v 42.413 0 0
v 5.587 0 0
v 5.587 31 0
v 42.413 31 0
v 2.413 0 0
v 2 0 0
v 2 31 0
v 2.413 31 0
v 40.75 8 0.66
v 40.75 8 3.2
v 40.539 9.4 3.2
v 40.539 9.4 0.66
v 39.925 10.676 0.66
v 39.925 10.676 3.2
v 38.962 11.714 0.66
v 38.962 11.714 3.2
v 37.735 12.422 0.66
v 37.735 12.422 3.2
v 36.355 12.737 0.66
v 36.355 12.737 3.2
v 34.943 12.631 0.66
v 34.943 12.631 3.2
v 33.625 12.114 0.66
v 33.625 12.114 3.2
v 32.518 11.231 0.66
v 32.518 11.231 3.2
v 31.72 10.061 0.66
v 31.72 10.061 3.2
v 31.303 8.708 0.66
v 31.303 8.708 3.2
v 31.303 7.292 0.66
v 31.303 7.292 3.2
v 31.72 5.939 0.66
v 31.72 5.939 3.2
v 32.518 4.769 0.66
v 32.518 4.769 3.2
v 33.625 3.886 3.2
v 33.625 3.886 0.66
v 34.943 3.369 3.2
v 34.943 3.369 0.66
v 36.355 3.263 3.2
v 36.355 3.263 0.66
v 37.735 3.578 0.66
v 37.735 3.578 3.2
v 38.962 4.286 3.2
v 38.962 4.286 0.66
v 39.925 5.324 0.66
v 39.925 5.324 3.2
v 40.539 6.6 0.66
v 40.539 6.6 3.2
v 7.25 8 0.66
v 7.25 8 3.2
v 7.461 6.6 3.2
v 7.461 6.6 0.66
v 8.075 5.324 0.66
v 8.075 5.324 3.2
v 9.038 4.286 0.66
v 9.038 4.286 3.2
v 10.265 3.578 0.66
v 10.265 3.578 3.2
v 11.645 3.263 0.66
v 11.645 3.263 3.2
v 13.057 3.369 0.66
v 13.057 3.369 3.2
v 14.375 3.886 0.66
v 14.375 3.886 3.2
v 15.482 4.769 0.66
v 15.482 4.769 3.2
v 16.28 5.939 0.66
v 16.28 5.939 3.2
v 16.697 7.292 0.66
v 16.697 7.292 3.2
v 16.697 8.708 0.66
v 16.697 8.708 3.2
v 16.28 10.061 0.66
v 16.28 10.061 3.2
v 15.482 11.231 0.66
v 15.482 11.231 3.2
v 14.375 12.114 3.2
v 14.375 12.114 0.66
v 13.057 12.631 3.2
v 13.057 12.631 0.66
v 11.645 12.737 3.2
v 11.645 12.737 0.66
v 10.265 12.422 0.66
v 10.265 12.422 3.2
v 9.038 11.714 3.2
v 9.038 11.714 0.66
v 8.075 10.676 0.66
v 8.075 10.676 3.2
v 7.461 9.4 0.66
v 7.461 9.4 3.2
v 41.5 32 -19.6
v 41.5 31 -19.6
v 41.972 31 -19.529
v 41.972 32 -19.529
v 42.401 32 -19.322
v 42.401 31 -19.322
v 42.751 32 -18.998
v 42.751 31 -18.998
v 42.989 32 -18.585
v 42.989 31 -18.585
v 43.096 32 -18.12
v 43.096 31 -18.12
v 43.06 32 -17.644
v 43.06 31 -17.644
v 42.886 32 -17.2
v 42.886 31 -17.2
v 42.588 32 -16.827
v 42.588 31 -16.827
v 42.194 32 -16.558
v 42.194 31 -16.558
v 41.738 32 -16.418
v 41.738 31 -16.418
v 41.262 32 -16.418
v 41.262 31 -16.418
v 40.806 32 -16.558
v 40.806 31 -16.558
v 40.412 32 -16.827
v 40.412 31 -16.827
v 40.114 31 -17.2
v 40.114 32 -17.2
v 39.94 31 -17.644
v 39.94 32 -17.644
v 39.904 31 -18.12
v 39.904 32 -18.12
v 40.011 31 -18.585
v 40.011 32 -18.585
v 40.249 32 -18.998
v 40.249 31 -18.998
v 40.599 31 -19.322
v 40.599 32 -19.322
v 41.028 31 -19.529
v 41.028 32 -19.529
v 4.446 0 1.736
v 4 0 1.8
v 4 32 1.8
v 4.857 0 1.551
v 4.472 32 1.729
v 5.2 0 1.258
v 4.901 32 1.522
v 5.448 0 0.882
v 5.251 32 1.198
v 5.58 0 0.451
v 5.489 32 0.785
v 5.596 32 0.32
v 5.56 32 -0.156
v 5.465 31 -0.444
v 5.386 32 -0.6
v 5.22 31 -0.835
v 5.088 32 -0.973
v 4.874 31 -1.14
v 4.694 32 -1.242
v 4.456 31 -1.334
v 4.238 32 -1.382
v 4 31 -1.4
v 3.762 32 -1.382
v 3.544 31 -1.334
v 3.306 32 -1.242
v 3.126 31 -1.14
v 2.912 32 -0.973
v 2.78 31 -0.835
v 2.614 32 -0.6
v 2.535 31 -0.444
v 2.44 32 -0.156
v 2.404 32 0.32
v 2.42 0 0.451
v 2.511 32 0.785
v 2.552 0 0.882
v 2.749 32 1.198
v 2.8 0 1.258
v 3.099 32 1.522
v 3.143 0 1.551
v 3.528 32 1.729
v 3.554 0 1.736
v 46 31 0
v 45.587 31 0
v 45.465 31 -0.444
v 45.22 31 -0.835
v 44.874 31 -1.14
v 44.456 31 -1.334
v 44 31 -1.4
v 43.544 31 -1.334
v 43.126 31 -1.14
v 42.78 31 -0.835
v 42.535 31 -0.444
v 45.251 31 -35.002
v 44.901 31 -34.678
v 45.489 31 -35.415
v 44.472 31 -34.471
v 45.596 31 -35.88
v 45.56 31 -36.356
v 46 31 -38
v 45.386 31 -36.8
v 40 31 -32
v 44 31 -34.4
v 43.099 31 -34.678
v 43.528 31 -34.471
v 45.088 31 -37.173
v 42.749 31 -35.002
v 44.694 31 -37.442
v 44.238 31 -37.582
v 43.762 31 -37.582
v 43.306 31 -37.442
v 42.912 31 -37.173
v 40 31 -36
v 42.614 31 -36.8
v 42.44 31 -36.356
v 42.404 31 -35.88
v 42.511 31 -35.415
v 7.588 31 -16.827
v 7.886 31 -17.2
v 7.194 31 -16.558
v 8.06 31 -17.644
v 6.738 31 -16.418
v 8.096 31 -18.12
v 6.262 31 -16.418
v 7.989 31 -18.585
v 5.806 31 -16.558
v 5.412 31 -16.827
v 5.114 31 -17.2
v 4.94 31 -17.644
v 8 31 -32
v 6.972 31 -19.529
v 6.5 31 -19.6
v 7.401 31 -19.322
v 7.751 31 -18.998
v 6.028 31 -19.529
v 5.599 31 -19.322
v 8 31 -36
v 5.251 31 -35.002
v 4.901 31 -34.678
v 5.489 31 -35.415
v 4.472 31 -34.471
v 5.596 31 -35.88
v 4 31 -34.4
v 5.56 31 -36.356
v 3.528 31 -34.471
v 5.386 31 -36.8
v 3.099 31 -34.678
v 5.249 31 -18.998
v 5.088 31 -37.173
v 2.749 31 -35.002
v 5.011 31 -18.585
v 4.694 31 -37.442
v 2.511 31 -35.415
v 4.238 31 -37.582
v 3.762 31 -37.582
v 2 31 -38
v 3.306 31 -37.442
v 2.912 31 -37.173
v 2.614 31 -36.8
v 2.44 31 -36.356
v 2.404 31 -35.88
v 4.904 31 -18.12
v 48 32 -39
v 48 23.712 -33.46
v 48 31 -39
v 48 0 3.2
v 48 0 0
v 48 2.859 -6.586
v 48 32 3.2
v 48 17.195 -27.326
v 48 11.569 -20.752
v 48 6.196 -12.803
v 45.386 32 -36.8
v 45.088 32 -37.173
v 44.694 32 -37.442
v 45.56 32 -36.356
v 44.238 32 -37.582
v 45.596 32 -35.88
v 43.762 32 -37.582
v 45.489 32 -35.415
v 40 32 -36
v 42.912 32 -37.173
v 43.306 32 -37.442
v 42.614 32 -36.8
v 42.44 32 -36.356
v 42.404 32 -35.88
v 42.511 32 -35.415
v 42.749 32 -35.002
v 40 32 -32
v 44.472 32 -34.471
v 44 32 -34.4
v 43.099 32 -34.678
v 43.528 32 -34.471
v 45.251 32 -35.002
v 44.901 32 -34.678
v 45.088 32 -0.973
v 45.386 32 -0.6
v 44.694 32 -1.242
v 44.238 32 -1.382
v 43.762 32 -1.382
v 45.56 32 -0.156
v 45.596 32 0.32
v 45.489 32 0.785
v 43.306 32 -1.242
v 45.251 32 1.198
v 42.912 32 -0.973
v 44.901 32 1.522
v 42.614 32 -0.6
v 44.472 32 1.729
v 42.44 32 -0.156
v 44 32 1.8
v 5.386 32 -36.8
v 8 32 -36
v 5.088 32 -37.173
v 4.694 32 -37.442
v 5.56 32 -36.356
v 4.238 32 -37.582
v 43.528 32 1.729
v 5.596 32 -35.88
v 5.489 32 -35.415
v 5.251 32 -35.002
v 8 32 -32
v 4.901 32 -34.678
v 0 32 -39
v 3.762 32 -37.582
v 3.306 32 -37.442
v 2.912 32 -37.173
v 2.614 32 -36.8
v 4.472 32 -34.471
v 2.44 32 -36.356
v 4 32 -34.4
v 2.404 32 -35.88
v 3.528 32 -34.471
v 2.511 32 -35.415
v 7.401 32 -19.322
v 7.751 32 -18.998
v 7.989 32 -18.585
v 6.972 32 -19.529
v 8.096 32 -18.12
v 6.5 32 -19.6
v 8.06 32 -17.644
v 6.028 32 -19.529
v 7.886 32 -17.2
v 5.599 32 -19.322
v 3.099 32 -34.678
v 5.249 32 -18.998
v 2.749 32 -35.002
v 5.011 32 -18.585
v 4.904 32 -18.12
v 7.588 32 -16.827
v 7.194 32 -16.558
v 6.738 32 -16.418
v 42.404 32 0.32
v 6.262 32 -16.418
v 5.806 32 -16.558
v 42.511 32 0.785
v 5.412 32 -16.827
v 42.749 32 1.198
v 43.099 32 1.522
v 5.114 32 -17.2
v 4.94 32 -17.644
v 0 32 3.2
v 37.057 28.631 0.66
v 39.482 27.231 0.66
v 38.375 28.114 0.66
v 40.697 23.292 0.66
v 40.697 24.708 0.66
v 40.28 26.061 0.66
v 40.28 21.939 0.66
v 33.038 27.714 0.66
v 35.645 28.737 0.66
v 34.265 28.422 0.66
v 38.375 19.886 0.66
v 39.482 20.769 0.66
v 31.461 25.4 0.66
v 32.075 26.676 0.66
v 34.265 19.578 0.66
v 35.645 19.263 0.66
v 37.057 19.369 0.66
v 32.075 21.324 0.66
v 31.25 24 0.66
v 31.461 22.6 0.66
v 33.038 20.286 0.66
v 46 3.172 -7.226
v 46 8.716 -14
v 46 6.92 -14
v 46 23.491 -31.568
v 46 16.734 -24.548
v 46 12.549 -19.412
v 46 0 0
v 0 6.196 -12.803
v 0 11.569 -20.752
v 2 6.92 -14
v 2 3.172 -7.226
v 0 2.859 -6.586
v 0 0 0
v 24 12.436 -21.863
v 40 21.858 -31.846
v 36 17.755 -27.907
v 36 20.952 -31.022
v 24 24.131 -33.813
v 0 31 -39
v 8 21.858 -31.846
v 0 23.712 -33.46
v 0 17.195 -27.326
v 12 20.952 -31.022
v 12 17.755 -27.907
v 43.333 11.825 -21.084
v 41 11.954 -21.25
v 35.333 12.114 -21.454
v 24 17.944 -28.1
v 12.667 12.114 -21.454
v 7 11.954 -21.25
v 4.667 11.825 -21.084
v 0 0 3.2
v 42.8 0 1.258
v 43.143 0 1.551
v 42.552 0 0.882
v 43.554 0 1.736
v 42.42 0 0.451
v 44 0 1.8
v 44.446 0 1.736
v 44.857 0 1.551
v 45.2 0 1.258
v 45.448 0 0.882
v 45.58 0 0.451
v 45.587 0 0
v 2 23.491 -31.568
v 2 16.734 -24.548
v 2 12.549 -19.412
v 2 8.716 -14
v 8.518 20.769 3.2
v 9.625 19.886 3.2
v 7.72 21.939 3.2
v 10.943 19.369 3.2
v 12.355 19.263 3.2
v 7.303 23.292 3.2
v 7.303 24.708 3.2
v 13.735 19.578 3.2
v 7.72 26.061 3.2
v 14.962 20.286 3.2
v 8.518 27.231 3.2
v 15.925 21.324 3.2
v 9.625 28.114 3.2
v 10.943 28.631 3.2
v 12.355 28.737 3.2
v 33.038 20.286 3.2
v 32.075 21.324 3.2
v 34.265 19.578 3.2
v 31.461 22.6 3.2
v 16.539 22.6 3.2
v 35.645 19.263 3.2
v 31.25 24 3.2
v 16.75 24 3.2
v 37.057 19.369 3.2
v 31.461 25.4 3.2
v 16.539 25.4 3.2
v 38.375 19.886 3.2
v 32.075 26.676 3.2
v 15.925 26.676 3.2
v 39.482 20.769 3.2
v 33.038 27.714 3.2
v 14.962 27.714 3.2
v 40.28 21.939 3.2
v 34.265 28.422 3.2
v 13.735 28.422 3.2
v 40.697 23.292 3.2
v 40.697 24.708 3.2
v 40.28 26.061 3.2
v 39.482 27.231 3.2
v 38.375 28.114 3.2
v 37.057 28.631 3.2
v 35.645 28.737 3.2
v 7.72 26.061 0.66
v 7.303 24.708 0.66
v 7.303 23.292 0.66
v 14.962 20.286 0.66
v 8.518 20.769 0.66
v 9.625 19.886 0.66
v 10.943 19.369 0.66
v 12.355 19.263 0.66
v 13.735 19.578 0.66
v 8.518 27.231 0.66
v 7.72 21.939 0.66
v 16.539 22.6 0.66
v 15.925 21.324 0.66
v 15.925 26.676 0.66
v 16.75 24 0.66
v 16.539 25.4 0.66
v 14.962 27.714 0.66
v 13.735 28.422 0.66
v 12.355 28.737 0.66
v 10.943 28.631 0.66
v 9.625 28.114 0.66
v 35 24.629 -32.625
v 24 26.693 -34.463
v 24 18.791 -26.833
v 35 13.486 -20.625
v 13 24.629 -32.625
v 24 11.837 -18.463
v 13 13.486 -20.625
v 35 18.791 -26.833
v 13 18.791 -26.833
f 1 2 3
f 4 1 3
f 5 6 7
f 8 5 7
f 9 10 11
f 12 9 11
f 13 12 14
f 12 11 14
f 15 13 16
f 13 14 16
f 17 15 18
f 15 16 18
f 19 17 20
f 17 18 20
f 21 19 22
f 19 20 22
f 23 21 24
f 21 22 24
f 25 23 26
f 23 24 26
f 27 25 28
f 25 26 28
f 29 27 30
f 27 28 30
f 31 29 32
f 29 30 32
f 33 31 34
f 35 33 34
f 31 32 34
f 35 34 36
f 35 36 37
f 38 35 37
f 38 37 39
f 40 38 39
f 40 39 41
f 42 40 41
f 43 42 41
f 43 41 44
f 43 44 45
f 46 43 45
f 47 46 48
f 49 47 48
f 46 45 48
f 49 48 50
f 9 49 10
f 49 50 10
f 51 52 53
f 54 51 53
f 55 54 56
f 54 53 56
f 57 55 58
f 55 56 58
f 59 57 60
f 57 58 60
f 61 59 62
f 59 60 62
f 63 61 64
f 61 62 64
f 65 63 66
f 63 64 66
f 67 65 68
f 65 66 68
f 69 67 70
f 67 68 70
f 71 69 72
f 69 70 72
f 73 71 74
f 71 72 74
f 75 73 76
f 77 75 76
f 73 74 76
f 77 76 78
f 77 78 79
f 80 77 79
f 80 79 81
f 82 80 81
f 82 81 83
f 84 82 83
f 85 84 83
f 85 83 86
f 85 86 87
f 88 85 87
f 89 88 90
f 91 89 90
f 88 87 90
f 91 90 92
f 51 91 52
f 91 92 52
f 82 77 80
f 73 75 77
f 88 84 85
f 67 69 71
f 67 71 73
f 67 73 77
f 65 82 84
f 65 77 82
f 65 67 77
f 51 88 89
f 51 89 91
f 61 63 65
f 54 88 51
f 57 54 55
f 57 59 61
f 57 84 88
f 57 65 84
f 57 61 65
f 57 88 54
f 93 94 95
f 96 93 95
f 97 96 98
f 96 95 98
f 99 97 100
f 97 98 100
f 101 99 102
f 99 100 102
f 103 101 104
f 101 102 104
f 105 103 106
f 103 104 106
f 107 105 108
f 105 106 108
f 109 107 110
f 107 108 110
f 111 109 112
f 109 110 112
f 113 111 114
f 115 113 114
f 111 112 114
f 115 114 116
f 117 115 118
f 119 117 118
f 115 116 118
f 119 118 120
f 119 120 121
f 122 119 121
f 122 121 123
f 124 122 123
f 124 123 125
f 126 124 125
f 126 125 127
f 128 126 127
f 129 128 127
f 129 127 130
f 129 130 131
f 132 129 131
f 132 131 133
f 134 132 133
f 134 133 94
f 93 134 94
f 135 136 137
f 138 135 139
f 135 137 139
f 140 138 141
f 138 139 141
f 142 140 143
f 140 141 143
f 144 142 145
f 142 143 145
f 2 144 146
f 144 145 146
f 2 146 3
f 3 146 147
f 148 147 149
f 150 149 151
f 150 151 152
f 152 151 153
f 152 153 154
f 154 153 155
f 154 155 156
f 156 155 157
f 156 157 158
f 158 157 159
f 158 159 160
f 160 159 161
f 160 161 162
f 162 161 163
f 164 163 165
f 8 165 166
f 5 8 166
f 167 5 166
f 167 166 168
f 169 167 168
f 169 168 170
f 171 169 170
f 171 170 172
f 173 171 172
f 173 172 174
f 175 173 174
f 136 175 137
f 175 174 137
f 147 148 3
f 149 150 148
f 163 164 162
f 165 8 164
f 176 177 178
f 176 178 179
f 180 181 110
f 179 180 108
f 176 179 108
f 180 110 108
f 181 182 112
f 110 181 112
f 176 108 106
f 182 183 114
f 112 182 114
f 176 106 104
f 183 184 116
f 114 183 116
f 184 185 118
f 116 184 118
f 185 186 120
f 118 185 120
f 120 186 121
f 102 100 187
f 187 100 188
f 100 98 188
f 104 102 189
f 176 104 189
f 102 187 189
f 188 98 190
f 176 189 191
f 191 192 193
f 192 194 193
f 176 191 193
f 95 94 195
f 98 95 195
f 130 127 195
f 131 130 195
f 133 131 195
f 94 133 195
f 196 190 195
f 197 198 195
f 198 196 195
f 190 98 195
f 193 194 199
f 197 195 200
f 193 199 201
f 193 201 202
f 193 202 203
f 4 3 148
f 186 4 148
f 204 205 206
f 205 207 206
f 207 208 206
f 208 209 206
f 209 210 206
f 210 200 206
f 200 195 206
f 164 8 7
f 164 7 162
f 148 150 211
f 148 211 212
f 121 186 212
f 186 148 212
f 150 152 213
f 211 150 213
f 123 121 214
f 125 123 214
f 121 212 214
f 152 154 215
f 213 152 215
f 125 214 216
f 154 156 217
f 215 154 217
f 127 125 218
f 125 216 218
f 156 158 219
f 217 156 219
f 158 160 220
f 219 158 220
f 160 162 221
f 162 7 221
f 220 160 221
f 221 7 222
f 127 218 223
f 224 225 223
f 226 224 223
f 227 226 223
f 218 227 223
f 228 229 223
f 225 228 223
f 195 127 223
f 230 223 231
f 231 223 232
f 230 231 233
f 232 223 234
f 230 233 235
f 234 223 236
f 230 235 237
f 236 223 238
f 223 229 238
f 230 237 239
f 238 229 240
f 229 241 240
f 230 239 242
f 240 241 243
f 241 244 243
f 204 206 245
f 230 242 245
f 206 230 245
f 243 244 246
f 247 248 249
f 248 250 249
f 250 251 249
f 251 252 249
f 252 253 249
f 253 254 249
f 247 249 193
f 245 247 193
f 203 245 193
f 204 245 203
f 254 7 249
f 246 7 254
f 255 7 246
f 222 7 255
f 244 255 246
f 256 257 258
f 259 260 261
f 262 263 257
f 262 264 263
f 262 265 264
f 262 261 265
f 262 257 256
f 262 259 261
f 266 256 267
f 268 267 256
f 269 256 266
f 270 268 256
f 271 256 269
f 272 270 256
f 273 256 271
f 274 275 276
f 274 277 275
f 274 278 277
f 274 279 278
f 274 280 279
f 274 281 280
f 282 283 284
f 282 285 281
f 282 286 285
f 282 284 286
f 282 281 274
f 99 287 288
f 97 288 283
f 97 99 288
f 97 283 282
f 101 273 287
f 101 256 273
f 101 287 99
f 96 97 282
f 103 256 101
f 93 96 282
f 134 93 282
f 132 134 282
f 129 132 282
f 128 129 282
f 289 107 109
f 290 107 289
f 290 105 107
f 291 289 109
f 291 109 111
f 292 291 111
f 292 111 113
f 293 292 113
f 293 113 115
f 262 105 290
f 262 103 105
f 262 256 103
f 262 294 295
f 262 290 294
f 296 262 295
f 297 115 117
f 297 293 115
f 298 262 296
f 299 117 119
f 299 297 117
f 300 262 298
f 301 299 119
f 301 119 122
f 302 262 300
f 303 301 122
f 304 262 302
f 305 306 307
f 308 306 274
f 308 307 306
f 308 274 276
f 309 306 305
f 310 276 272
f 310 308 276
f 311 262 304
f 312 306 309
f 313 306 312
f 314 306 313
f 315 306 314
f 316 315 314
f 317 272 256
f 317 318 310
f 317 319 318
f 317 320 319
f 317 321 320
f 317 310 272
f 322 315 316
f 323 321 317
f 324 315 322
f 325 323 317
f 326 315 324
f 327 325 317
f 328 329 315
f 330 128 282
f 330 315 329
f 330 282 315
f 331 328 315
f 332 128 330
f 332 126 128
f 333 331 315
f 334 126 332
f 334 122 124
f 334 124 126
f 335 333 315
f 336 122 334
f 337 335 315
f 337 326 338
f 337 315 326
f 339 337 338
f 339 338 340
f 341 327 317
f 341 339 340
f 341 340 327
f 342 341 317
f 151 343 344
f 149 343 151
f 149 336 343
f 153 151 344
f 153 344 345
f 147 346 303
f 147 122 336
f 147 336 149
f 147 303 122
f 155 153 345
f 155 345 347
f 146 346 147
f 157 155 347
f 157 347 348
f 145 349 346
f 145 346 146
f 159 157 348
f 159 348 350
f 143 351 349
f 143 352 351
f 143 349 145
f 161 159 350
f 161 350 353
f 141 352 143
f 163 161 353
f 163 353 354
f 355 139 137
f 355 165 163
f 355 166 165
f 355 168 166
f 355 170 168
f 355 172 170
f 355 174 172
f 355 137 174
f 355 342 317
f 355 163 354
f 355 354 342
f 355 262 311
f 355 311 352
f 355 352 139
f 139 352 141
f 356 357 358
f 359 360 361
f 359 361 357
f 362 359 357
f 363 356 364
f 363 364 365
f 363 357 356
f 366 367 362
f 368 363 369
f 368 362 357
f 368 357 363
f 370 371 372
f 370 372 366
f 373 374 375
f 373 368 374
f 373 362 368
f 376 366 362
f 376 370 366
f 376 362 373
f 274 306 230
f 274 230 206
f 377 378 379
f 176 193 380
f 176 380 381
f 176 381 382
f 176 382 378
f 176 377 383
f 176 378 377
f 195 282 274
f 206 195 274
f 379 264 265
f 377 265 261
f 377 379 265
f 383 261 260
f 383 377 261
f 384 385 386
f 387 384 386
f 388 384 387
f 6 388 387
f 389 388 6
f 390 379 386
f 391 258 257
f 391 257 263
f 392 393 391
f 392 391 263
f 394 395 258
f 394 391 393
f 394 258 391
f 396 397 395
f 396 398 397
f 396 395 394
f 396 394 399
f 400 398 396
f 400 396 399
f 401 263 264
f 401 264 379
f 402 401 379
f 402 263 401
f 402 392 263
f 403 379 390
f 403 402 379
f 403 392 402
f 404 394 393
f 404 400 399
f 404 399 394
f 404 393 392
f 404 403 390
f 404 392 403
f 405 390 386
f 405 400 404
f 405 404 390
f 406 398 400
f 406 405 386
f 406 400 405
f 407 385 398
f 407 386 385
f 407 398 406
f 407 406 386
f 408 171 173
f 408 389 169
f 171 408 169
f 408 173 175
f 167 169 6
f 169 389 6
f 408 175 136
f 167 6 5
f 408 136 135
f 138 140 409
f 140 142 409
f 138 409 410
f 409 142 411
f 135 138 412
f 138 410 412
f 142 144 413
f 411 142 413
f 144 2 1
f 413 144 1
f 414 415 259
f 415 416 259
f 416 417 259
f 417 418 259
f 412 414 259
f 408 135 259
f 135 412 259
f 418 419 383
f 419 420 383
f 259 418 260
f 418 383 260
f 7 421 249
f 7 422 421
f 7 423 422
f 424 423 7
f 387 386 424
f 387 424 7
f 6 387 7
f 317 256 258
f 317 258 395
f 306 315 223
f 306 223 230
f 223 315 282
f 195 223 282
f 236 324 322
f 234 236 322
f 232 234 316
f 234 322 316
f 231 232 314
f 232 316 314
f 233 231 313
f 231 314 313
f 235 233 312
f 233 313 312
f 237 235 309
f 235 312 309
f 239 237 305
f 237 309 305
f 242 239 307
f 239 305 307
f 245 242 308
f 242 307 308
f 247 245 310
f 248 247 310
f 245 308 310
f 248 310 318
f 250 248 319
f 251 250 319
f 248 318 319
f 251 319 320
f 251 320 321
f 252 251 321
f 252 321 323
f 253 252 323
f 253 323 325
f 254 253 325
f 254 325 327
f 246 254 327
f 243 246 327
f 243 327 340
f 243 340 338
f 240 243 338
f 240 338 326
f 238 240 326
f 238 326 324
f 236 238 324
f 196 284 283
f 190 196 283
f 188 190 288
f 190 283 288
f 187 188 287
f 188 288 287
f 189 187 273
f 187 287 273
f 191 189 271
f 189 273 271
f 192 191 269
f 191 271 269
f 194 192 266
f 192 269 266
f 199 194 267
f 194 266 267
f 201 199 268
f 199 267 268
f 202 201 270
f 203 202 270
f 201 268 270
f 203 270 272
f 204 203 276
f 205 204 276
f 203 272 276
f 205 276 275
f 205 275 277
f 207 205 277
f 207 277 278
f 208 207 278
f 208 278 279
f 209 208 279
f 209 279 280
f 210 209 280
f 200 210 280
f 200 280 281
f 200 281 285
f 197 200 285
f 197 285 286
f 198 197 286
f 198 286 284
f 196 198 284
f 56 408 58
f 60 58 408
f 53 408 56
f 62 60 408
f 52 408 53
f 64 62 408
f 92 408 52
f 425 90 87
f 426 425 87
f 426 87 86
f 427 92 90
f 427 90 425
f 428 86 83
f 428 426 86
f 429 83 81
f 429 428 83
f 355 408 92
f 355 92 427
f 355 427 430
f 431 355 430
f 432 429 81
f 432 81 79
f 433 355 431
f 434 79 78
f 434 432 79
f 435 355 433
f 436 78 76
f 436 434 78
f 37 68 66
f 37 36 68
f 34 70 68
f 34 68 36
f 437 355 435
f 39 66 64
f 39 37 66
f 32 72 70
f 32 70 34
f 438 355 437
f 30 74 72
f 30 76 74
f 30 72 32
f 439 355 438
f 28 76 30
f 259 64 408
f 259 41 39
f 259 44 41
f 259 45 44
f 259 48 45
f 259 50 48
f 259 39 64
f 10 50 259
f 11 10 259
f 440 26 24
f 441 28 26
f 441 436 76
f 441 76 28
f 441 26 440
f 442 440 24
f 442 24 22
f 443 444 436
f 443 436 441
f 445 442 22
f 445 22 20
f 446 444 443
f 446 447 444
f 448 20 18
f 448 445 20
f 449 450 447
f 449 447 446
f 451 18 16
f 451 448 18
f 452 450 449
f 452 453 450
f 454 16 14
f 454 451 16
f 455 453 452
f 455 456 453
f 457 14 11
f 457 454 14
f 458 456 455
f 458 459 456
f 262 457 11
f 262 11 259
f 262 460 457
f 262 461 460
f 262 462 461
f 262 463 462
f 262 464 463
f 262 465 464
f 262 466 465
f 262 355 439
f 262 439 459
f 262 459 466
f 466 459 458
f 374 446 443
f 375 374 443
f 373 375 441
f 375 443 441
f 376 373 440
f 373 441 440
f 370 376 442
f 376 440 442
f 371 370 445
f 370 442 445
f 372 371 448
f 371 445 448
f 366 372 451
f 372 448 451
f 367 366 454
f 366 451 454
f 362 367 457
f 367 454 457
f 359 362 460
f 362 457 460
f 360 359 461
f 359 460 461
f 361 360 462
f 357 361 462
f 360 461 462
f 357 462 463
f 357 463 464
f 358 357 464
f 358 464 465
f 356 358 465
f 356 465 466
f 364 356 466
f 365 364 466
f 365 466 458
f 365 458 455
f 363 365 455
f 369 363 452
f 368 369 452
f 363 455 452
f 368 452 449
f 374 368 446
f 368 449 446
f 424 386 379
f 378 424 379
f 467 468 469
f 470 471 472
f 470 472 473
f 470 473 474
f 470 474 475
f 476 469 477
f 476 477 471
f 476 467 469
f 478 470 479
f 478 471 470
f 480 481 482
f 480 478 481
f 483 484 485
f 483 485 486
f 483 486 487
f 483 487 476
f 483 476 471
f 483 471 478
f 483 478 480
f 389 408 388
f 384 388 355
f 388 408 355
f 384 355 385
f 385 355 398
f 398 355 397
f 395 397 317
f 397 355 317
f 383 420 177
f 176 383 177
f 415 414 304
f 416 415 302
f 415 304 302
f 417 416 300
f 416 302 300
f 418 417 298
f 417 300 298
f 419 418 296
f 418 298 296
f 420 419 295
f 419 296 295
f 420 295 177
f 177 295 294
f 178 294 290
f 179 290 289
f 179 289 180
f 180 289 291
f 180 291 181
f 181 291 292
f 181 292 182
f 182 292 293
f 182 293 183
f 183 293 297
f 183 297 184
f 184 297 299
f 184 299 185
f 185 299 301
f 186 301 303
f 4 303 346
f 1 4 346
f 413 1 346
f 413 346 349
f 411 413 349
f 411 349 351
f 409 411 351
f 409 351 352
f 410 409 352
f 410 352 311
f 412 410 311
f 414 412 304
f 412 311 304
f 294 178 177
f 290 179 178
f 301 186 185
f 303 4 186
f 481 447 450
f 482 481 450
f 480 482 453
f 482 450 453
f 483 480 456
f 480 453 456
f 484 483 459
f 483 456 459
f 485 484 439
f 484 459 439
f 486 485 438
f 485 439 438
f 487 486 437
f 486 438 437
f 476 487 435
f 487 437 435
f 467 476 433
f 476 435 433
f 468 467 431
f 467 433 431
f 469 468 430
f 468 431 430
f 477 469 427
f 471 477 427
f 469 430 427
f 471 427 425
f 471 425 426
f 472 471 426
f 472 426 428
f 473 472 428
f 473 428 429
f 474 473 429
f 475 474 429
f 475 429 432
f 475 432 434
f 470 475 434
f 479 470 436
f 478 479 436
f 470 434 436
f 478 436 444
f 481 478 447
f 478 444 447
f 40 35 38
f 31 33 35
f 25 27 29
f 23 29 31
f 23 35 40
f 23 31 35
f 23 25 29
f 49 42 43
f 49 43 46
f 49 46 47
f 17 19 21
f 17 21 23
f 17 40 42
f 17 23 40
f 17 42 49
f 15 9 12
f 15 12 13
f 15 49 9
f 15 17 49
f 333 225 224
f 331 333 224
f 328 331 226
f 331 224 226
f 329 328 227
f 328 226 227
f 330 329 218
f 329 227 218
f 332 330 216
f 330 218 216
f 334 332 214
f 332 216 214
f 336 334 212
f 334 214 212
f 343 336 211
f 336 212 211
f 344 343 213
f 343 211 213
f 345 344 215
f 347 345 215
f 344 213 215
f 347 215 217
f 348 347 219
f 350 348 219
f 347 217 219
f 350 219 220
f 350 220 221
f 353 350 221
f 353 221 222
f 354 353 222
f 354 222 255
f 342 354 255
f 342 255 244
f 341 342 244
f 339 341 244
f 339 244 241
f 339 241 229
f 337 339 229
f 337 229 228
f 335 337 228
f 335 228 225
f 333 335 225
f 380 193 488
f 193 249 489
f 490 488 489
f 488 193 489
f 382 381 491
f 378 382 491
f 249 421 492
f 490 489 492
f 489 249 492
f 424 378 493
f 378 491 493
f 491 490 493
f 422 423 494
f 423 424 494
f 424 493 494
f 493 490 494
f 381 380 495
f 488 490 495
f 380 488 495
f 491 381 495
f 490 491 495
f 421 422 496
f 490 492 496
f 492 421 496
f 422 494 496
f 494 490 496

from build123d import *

# Parameters (mm, degrees)
CROQUIS1_W                        = 48
CROQUIS1_H                        = 32
SALIENTE_EXTRUIR1_DEPTH           = 3.2
CROQUIS2_W                        = 48
CROQUIS2_H                        = 1
SALIENTE_EXTRUIR2_DEPTH           = 39
TALADRO_DE_MARGEN_PARA_M31_D      = 3.2
SALIENTE_EXTRUIR3_DEPTH           = 48
CORTAR_EXTRUIR1_DEPTH             = 46
CORTAR_EXTRUIR2_REACH             = 71.635
CROQUIS7_W                        = 44
CROQUIS7_H                        = 14
SALIENTE_EXTRUIR4_DEPTH           = 2
CORTAR_EXTRUIR3_REACH             = 71.635
CROQUIS9_W                        = 32
CROQUIS9_H                        = 4
CROQUIS10_R                       = 4.75
CORTAR_EXTRUIR4_DEPTH             = 2.54
TALADRO_DE_MARGEN_PARA_M32_REACH  = 69.057
TALADRO_DE_MARGEN_PARA_M32_BORE_R = 1.6


with BuildPart() as part:
    # Croquis1 → Saliente-Extruir1 (new body)
    with BuildSketch(Plane.XY):
        with Locations((24, 16)):
            Rectangle(CROQUIS1_W, CROQUIS1_H)
    extrude(amount=SALIENTE_EXTRUIR1_DEPTH)

    # Croquis2 → Saliente-Extruir2 (add)
    with BuildSketch(Plane(origin=(0, 0, 0), x_dir=(-1, 0, 0), z_dir=(0, 0, -1))):
        with Locations((-24, 31.5)):
            Rectangle(CROQUIS2_W, CROQUIS2_H)
    extrude(amount=SALIENTE_EXTRUIR2_DEPTH)

    # Taladro de margen para M31 (through all)
    with Locations(Plane(origin=(6.5, 32, -18), x_dir=(0, 0, 1), z_dir=(0, 1, 0))):
        with Locations((0, 0), (0, 35)):
            Hole(TALADRO_DE_MARGEN_PARA_M31_D / 2)

    # Croquis5 → Saliente-Extruir3 (add)
    with BuildSketch(Plane.ZY):
        with BuildLine():
            Line((0, 0), (0, 31))
            Line((0, 31), (-39, 31))
            add(Edge.make_bspline(
                [(-39, 31), (-24.225246719, 9.372950474), (0, 0)],
                knots=[0, 0, 0, 1, 1, 1], degree=2))
        make_face()
    extrude(amount=-SALIENTE_EXTRUIR3_DEPTH)

    # Croquis6 → Cortar-Extruir1 (cut)
    with BuildSketch(Plane.ZY):
        with BuildLine():
            Line((0, 31), (-38, 31))
            add(Edge.make_bspline(
                [(-38, 31), (-22.667891875, 11.302250625), (0, 1)],
                knots=[0, 0, 0, 1, 1, 1], degree=2))
            Line((0, 1), (0, 31))
        make_face()
    extrude(amount=-CORTAR_EXTRUIR1_DEPTH, mode=Mode.SUBTRACT)

    # Croquis7 → Cortar-Extruir2 (cut, up to next)
    with BuildSketch(Plane.XZ, mode=Mode.PRIVATE) as cortar_extruir2_sk1:
        with Locations((24, -7)):
            Rectangle(CROQUIS7_W, CROQUIS7_H)
    cortar_extruir2_tool1 = extrude(cortar_extruir2_sk1.sketch, amount=-CORTAR_EXTRUIR2_REACH, mode=Mode.PRIVATE) & part.part
    add(cortar_extruir2_tool1.solids().sort_by_distance((24, 0, -7))[0], mode=Mode.SUBTRACT)

    # Croquis8 → Saliente-Extruir4 (add)
    with BuildSketch(Plane.ZY):
        with BuildLine():
            Line((-38, 31), (0, 31))
            Line((0, 31), (0, 1))
            add(Edge.make_bspline(
                [(-38, 31), (-22.667891875, 11.302250625), (0, 1)],
                knots=[0, 0, 0, 1, 1, 1], degree=2))
        make_face()
    extrude(amount=-SALIENTE_EXTRUIR4_DEPTH)

    # Croquis9 → Cortar-Extruir3 (cut, up to next)
    with BuildSketch(Plane(origin=(0, 32, 0), x_dir=(1, 0, 0), z_dir=(0, 1, 0)), mode=Mode.PRIVATE) as cortar_extruir3_sk1:
        with Locations((24, 34)):
            Rectangle(CROQUIS9_W, CROQUIS9_H)
    cortar_extruir3_tool1 = extrude(cortar_extruir3_sk1.sketch, amount=-CORTAR_EXTRUIR3_REACH, mode=Mode.PRIVATE) & part.part
    add(cortar_extruir3_tool1.solids().sort_by_distance((24, 32, -34))[0], mode=Mode.SUBTRACT)

    # Croquis10 → Cortar-Extruir4 (cut)
    with BuildSketch(Plane.XY.offset(3.2)):
        with Locations((12, 24)):
            Circle(CROQUIS10_R)
        with Locations(Location((36, 24, 0), (0, 0, 180))):
            Circle(CROQUIS10_R)
        with Locations((36, 8)):
            Circle(CROQUIS10_R)
        with Locations(Location((12, 8, 0), (0, 0, 180))):
            Circle(CROQUIS10_R)
    extrude(amount=-CORTAR_EXTRUIR4_DEPTH, mode=Mode.SUBTRACT)

    # Taladro de margen para M32 bore (on position points) → Taladro de margen para M32 (cut, up to next)
    with BuildSketch(Plane(origin=(4, 32, -36), x_dir=(0, 0, 1), z_dir=(0, 1, 0)), mode=Mode.PRIVATE) as taladro_de_margen_para_m32_sk1:
        Circle(TALADRO_DE_MARGEN_PARA_M32_BORE_R)
    taladro_de_margen_para_m32_tool1 = extrude(taladro_de_margen_para_m32_sk1.sketch, amount=-TALADRO_DE_MARGEN_PARA_M32_REACH, mode=Mode.PRIVATE) & part.part
    # Taladro de margen para M32 bore (on position points) → Taladro de margen para M32 (cut, up to next)
    with BuildSketch(Plane(origin=(4, 32, -36), x_dir=(0, 0, 1), z_dir=(0, 1, 0)), mode=Mode.PRIVATE) as taladro_de_margen_para_m32_sk2:
        with Locations((36.2, 0)):
            Circle(TALADRO_DE_MARGEN_PARA_M32_BORE_R)
    taladro_de_margen_para_m32_tool2 = extrude(taladro_de_margen_para_m32_sk2.sketch, amount=-TALADRO_DE_MARGEN_PARA_M32_REACH, mode=Mode.PRIVATE) & part.part
    # Taladro de margen para M32 bore (on position points) → Taladro de margen para M32 (cut, up to next)
    with BuildSketch(Plane(origin=(4, 32, -36), x_dir=(0, 0, 1), z_dir=(0, 1, 0)), mode=Mode.PRIVATE) as taladro_de_margen_para_m32_sk3:
        with Locations((36.2, 40)):
            Circle(TALADRO_DE_MARGEN_PARA_M32_BORE_R)
    taladro_de_margen_para_m32_tool3 = extrude(taladro_de_margen_para_m32_sk3.sketch, amount=-TALADRO_DE_MARGEN_PARA_M32_REACH, mode=Mode.PRIVATE) & part.part
    # Taladro de margen para M32 bore (on position points) → Taladro de margen para M32 (cut, up to next)
    with BuildSketch(Plane(origin=(4, 32, -36), x_dir=(0, 0, 1), z_dir=(0, 1, 0)), mode=Mode.PRIVATE) as taladro_de_margen_para_m32_sk4:
        with Locations((0, 40)):
            Circle(TALADRO_DE_MARGEN_PARA_M32_BORE_R)
    taladro_de_margen_para_m32_tool4 = extrude(taladro_de_margen_para_m32_sk4.sketch, amount=-TALADRO_DE_MARGEN_PARA_M32_REACH, mode=Mode.PRIVATE) & part.part
    add(taladro_de_margen_para_m32_tool1.solids().sort_by_distance((4, 32, -36))[0], mode=Mode.SUBTRACT)
    add(taladro_de_margen_para_m32_tool2.solids().sort_by_distance((4, 32, 0.2))[0], mode=Mode.SUBTRACT)
    add(taladro_de_margen_para_m32_tool3.solids().sort_by_distance((44, 32, 0.2))[0], mode=Mode.SUBTRACT)
    add(taladro_de_margen_para_m32_tool4.solids().sort_by_distance((44, 32, -36))[0], mode=Mode.SUBTRACT)


solid = part.part
